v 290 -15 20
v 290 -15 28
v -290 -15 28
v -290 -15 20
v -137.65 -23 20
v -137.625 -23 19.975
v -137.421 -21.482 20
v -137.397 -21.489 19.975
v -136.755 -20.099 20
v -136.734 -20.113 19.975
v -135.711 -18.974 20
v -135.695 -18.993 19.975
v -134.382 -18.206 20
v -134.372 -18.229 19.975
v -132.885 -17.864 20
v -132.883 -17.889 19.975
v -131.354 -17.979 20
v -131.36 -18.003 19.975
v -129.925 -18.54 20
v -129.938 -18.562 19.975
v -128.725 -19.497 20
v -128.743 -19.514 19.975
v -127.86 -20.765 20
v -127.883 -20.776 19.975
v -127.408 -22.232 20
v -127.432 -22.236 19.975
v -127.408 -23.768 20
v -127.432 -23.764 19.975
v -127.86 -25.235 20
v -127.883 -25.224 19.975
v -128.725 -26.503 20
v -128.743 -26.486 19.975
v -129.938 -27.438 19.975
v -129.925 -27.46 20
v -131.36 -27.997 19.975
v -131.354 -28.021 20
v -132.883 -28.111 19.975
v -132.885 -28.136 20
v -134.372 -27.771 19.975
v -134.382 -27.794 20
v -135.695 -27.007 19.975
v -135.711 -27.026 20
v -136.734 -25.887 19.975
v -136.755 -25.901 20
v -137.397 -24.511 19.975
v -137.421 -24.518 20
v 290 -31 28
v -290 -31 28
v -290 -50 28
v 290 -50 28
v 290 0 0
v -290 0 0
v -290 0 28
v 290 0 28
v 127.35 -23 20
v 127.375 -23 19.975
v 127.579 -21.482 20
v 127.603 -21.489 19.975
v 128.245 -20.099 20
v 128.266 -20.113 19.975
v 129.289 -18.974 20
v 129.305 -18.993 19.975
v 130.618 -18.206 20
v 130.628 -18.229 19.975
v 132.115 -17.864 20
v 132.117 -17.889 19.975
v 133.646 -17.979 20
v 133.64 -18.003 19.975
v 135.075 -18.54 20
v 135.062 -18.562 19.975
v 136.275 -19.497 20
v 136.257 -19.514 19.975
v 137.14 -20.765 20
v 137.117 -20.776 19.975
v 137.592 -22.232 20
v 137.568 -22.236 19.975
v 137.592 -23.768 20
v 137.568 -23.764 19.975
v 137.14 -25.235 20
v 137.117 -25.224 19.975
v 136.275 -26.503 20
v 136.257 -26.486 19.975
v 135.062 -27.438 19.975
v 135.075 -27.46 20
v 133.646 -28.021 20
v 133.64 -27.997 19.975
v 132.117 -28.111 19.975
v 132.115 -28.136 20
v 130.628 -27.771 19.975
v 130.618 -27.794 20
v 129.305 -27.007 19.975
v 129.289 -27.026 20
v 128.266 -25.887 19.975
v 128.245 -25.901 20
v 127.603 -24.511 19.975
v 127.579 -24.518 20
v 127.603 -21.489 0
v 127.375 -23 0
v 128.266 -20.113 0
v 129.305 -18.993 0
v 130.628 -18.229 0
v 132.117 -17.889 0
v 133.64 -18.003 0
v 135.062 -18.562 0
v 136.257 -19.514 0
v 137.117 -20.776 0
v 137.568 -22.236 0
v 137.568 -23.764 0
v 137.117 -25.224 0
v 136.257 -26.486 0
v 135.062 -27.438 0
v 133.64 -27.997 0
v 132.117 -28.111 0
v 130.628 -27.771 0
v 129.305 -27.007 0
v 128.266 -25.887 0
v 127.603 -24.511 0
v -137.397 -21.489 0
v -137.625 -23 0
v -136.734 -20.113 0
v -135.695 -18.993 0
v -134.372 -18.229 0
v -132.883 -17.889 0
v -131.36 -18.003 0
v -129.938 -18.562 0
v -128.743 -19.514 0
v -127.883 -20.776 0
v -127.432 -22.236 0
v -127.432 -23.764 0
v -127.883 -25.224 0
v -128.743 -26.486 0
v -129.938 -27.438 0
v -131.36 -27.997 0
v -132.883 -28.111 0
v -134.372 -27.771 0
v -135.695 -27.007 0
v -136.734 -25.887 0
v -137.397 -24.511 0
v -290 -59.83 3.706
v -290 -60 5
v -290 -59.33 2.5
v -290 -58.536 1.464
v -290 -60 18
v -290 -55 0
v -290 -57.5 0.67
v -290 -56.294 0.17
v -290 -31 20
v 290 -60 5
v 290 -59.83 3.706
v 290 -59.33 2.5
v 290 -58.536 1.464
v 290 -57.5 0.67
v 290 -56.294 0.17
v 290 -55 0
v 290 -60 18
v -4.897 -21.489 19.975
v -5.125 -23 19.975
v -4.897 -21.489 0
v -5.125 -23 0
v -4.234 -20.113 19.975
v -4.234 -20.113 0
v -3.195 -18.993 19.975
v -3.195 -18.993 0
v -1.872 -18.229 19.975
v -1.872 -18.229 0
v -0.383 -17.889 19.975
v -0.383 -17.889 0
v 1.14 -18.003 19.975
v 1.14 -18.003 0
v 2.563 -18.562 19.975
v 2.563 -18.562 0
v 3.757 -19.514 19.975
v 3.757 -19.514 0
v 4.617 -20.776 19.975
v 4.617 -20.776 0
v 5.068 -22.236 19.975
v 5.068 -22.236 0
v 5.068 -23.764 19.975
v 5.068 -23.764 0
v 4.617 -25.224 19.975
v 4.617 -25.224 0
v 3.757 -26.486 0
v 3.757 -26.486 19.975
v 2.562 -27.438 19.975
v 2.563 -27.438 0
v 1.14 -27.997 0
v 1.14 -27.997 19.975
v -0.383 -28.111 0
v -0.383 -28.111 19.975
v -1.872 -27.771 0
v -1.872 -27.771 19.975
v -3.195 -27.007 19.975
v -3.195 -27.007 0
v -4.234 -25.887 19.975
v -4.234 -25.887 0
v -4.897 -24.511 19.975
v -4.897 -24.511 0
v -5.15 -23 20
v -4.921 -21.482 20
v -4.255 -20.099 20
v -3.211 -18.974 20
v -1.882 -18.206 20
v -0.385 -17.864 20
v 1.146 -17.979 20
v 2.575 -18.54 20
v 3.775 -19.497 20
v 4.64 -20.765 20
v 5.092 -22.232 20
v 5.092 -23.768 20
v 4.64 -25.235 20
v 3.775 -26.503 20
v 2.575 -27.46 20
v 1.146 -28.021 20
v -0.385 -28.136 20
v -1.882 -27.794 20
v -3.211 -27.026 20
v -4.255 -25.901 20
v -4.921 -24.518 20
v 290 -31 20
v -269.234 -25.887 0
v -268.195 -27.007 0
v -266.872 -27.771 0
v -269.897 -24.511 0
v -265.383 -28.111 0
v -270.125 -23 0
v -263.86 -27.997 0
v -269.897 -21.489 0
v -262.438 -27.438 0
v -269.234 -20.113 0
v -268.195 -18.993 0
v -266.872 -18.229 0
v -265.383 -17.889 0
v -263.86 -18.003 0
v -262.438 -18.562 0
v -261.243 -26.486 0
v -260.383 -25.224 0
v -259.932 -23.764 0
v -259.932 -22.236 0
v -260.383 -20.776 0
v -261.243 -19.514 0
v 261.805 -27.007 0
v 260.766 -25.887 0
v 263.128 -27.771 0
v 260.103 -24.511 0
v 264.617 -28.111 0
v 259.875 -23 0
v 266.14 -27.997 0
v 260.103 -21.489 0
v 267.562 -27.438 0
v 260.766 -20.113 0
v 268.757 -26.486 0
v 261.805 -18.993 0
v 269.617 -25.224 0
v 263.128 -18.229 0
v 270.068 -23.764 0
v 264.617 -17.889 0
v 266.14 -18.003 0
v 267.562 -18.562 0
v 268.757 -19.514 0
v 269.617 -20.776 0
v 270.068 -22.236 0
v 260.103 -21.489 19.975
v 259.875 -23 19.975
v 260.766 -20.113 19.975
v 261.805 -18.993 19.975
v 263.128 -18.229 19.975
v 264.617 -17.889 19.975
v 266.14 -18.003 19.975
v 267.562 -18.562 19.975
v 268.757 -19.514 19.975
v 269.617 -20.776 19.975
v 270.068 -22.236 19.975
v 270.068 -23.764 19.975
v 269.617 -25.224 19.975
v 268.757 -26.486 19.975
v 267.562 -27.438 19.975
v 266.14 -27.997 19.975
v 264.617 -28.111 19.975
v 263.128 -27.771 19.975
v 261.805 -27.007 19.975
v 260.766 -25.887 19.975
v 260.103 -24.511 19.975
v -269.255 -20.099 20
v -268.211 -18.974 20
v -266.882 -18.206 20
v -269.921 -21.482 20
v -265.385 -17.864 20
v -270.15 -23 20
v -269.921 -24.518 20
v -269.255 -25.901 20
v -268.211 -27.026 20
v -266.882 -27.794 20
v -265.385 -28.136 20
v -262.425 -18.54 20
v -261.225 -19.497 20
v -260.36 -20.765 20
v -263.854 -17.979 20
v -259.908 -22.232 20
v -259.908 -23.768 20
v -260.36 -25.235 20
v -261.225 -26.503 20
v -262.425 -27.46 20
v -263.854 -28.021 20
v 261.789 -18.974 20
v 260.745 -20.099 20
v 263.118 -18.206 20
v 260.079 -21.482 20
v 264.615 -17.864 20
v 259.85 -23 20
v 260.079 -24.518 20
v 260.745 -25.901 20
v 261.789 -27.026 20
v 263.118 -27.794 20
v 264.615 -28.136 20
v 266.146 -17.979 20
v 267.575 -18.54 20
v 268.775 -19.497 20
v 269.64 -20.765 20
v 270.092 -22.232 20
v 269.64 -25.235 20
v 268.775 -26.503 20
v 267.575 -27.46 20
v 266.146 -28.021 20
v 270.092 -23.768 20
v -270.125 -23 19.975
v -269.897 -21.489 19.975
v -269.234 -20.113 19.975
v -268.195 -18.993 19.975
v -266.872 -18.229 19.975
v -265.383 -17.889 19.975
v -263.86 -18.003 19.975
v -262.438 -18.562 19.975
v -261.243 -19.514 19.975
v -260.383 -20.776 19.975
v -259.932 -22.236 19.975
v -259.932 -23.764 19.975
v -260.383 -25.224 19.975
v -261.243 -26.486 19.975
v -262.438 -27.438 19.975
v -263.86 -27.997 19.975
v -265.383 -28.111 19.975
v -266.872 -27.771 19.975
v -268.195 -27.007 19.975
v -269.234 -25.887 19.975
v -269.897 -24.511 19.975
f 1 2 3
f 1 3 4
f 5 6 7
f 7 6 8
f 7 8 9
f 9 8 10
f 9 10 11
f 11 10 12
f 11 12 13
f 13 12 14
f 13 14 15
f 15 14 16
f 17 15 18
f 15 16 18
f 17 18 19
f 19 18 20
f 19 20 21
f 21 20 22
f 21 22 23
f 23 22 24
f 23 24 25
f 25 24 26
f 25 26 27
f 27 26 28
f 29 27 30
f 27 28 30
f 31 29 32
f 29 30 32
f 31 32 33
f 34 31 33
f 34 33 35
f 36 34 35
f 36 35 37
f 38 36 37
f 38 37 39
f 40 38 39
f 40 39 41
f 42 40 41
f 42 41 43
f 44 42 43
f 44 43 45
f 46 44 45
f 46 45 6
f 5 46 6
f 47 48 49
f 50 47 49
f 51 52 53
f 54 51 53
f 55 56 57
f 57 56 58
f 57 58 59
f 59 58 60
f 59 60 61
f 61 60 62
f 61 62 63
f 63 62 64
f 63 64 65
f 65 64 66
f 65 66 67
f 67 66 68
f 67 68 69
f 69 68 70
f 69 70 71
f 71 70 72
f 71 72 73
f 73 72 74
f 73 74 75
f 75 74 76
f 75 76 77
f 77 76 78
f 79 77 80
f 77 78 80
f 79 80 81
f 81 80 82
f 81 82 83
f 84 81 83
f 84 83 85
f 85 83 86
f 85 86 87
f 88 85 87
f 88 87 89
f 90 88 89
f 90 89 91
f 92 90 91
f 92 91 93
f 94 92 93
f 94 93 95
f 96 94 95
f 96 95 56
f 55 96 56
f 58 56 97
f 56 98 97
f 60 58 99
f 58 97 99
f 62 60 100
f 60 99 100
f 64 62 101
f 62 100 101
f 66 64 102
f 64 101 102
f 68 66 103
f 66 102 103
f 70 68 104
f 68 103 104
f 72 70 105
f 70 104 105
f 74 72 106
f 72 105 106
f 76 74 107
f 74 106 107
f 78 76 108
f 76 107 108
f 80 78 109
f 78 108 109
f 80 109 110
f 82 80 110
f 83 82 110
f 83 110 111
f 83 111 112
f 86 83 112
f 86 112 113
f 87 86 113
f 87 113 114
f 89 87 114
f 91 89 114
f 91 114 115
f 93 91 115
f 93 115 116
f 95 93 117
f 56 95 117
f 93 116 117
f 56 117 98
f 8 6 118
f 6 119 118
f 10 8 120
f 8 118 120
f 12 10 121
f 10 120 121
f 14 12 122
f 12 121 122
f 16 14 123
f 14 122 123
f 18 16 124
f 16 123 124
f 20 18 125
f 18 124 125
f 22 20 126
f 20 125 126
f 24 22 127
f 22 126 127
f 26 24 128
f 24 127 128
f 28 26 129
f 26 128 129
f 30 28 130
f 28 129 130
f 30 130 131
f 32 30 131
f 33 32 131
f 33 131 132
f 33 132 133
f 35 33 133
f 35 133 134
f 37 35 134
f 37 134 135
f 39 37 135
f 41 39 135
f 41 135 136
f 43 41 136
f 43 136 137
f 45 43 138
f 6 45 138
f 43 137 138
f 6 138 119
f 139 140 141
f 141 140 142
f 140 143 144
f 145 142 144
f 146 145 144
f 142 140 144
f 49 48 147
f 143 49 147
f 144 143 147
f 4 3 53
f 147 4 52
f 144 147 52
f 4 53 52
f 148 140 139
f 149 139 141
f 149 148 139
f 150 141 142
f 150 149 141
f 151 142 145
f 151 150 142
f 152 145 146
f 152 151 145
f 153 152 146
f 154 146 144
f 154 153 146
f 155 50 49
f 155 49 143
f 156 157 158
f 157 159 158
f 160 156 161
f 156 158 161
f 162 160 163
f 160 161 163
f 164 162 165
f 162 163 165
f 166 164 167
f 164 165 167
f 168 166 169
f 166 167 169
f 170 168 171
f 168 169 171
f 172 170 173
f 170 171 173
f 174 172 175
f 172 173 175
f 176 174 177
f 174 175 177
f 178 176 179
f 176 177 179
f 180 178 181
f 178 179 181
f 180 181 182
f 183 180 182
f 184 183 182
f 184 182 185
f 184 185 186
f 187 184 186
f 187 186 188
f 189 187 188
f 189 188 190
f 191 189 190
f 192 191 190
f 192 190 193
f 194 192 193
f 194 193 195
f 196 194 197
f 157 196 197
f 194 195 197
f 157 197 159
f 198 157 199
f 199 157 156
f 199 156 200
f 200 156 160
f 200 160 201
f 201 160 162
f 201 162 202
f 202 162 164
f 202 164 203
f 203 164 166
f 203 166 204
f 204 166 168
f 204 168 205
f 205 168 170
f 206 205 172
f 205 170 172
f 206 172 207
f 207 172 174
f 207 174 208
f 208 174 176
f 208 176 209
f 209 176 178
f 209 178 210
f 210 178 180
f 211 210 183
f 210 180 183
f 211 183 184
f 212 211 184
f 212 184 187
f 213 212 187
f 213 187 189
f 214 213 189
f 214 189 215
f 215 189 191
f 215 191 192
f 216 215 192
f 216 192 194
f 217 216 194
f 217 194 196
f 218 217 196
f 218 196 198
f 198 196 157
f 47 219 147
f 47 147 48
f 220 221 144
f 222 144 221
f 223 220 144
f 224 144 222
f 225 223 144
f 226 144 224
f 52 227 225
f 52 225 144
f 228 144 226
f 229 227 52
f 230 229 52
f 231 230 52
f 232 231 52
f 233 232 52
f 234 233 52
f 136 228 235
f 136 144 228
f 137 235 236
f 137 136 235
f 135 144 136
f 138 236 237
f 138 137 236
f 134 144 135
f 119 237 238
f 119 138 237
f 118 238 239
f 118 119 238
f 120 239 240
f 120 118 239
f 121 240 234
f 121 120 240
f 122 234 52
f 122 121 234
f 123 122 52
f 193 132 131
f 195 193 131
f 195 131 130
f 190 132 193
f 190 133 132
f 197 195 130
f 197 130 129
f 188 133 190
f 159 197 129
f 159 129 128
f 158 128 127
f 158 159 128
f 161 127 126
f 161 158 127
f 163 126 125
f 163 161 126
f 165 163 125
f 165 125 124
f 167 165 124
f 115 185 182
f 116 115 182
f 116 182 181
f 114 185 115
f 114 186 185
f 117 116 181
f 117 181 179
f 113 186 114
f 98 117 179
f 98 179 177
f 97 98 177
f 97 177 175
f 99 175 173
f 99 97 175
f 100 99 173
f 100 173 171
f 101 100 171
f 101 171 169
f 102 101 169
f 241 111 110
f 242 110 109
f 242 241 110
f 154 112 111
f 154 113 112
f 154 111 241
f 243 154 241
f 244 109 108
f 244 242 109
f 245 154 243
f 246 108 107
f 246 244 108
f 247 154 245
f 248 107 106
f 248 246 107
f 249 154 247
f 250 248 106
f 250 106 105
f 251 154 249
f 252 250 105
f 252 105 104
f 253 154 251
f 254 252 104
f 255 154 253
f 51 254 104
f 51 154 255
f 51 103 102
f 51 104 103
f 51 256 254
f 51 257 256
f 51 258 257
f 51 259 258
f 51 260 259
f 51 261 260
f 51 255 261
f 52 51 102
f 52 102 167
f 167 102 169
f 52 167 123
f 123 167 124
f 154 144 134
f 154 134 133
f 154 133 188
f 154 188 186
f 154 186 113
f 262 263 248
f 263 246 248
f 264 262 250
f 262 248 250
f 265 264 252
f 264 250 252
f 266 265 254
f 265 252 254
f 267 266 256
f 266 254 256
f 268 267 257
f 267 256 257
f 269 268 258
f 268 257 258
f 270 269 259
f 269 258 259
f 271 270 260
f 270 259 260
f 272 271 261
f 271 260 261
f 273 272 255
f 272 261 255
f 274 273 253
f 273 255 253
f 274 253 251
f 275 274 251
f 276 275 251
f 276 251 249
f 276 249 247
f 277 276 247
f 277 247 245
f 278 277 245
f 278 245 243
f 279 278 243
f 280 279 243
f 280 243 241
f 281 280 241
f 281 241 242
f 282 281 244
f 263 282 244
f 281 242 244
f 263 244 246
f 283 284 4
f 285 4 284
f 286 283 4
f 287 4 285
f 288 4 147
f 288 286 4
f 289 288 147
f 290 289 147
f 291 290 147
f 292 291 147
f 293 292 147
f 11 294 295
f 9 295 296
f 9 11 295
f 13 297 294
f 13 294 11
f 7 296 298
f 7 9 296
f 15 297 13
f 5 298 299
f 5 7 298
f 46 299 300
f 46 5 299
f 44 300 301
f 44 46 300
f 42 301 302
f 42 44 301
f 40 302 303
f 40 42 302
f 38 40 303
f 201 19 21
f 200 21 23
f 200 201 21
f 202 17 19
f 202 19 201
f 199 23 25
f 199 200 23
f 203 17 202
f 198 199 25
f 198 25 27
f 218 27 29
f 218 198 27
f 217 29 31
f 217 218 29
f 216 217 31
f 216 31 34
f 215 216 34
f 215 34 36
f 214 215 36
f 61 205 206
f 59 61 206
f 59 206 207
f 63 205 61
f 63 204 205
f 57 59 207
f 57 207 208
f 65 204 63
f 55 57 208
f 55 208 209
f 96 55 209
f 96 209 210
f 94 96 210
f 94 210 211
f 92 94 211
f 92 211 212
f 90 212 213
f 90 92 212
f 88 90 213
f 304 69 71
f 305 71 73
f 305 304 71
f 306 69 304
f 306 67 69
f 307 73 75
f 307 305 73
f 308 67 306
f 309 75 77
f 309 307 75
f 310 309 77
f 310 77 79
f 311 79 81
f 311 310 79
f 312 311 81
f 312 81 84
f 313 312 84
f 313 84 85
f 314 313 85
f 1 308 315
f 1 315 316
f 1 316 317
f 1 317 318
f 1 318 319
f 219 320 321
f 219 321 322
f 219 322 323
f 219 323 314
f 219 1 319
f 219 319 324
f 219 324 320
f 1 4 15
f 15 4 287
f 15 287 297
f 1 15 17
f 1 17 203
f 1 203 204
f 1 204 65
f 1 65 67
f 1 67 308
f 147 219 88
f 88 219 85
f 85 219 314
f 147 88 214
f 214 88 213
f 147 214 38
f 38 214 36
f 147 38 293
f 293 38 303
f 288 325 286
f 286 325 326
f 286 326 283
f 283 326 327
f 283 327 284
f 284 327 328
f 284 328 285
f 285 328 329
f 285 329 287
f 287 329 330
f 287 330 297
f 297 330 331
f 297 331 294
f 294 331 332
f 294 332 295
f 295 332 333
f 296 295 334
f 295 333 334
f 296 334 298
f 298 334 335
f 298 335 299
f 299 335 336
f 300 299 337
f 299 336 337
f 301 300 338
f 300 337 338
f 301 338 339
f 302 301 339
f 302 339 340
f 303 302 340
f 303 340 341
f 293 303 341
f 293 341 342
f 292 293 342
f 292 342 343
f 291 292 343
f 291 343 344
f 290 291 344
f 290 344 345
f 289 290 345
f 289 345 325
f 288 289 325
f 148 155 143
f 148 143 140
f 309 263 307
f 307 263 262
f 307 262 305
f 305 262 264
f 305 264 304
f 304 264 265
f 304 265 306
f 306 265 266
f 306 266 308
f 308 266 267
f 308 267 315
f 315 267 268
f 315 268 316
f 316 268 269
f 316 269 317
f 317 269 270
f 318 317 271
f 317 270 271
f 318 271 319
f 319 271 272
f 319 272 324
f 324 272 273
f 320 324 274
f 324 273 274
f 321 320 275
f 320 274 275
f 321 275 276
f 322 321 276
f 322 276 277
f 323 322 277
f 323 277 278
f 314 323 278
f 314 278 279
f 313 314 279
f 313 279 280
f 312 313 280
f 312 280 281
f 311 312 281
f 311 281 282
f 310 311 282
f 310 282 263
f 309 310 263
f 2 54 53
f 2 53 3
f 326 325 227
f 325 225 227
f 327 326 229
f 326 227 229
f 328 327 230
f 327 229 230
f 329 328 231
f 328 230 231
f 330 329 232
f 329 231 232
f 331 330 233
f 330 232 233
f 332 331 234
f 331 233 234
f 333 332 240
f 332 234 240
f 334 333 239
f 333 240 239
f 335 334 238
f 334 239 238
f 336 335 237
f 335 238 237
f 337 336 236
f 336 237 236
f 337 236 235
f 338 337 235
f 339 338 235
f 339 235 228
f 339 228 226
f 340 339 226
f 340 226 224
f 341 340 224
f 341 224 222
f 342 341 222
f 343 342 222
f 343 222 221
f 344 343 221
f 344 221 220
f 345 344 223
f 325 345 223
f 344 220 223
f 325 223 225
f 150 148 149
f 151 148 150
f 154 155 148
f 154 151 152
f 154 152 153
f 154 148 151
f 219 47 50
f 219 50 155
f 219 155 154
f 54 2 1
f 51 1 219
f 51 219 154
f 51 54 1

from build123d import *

# Parameters (mm, degrees)
BOSS_EXTRUDE1_DEPTH                     = 290
TAP_DRILL_FOR_M10_HELICOIL1_D           = 10.25
TAP_DRILL_FOR_M10_HELICOIL1_CSINK_D     = 10.3
TAP_DRILL_FOR_M10_HELICOIL1_CSINK_ANGLE = 90


with BuildPart() as part:
    # Sketch1 → Boss-Extrude1 (new, symmetric)
    with BuildSketch(Plane(origin=(0, 0, 0), x_dir=(0, 0, -1), z_dir=(1, 0, 0))):
        with BuildLine():
            Line((0, 0), (-28, 0))
            Line((-28, 0), (-28, -15))
            Line((-28, -15), (-20, -15))
            Line((-20, -15), (-20, -31))
            Line((-20, -31), (-28, -31))
            Line((-28, -31), (-28, -50))
            Line((-28, -50), (-18, -60))
            Line((-18, -60), (-5, -60))
            ThreePointArc((-5, -60), (-1.464466094, -58.535533906), (0, -55))
            Line((0, -55), (0, 0))
        make_face()
    extrude(amount=BOSS_EXTRUDE1_DEPTH, both=True)

    # Tap Drill for M10 Helicoil1 (through all)
    with Locations(Plane(origin=(-265, -23, 20), x_dir=(1, 0, 0), z_dir=(0, 0, 1))):
        with Locations((0, 0), (132.5, 0), (265, 0), (397.5, 0), (530, 0)):
            CounterSinkHole(TAP_DRILL_FOR_M10_HELICOIL1_D / 2, TAP_DRILL_FOR_M10_HELICOIL1_CSINK_D / 2, counter_sink_angle=TAP_DRILL_FOR_M10_HELICOIL1_CSINK_ANGLE)


solid = part.part
